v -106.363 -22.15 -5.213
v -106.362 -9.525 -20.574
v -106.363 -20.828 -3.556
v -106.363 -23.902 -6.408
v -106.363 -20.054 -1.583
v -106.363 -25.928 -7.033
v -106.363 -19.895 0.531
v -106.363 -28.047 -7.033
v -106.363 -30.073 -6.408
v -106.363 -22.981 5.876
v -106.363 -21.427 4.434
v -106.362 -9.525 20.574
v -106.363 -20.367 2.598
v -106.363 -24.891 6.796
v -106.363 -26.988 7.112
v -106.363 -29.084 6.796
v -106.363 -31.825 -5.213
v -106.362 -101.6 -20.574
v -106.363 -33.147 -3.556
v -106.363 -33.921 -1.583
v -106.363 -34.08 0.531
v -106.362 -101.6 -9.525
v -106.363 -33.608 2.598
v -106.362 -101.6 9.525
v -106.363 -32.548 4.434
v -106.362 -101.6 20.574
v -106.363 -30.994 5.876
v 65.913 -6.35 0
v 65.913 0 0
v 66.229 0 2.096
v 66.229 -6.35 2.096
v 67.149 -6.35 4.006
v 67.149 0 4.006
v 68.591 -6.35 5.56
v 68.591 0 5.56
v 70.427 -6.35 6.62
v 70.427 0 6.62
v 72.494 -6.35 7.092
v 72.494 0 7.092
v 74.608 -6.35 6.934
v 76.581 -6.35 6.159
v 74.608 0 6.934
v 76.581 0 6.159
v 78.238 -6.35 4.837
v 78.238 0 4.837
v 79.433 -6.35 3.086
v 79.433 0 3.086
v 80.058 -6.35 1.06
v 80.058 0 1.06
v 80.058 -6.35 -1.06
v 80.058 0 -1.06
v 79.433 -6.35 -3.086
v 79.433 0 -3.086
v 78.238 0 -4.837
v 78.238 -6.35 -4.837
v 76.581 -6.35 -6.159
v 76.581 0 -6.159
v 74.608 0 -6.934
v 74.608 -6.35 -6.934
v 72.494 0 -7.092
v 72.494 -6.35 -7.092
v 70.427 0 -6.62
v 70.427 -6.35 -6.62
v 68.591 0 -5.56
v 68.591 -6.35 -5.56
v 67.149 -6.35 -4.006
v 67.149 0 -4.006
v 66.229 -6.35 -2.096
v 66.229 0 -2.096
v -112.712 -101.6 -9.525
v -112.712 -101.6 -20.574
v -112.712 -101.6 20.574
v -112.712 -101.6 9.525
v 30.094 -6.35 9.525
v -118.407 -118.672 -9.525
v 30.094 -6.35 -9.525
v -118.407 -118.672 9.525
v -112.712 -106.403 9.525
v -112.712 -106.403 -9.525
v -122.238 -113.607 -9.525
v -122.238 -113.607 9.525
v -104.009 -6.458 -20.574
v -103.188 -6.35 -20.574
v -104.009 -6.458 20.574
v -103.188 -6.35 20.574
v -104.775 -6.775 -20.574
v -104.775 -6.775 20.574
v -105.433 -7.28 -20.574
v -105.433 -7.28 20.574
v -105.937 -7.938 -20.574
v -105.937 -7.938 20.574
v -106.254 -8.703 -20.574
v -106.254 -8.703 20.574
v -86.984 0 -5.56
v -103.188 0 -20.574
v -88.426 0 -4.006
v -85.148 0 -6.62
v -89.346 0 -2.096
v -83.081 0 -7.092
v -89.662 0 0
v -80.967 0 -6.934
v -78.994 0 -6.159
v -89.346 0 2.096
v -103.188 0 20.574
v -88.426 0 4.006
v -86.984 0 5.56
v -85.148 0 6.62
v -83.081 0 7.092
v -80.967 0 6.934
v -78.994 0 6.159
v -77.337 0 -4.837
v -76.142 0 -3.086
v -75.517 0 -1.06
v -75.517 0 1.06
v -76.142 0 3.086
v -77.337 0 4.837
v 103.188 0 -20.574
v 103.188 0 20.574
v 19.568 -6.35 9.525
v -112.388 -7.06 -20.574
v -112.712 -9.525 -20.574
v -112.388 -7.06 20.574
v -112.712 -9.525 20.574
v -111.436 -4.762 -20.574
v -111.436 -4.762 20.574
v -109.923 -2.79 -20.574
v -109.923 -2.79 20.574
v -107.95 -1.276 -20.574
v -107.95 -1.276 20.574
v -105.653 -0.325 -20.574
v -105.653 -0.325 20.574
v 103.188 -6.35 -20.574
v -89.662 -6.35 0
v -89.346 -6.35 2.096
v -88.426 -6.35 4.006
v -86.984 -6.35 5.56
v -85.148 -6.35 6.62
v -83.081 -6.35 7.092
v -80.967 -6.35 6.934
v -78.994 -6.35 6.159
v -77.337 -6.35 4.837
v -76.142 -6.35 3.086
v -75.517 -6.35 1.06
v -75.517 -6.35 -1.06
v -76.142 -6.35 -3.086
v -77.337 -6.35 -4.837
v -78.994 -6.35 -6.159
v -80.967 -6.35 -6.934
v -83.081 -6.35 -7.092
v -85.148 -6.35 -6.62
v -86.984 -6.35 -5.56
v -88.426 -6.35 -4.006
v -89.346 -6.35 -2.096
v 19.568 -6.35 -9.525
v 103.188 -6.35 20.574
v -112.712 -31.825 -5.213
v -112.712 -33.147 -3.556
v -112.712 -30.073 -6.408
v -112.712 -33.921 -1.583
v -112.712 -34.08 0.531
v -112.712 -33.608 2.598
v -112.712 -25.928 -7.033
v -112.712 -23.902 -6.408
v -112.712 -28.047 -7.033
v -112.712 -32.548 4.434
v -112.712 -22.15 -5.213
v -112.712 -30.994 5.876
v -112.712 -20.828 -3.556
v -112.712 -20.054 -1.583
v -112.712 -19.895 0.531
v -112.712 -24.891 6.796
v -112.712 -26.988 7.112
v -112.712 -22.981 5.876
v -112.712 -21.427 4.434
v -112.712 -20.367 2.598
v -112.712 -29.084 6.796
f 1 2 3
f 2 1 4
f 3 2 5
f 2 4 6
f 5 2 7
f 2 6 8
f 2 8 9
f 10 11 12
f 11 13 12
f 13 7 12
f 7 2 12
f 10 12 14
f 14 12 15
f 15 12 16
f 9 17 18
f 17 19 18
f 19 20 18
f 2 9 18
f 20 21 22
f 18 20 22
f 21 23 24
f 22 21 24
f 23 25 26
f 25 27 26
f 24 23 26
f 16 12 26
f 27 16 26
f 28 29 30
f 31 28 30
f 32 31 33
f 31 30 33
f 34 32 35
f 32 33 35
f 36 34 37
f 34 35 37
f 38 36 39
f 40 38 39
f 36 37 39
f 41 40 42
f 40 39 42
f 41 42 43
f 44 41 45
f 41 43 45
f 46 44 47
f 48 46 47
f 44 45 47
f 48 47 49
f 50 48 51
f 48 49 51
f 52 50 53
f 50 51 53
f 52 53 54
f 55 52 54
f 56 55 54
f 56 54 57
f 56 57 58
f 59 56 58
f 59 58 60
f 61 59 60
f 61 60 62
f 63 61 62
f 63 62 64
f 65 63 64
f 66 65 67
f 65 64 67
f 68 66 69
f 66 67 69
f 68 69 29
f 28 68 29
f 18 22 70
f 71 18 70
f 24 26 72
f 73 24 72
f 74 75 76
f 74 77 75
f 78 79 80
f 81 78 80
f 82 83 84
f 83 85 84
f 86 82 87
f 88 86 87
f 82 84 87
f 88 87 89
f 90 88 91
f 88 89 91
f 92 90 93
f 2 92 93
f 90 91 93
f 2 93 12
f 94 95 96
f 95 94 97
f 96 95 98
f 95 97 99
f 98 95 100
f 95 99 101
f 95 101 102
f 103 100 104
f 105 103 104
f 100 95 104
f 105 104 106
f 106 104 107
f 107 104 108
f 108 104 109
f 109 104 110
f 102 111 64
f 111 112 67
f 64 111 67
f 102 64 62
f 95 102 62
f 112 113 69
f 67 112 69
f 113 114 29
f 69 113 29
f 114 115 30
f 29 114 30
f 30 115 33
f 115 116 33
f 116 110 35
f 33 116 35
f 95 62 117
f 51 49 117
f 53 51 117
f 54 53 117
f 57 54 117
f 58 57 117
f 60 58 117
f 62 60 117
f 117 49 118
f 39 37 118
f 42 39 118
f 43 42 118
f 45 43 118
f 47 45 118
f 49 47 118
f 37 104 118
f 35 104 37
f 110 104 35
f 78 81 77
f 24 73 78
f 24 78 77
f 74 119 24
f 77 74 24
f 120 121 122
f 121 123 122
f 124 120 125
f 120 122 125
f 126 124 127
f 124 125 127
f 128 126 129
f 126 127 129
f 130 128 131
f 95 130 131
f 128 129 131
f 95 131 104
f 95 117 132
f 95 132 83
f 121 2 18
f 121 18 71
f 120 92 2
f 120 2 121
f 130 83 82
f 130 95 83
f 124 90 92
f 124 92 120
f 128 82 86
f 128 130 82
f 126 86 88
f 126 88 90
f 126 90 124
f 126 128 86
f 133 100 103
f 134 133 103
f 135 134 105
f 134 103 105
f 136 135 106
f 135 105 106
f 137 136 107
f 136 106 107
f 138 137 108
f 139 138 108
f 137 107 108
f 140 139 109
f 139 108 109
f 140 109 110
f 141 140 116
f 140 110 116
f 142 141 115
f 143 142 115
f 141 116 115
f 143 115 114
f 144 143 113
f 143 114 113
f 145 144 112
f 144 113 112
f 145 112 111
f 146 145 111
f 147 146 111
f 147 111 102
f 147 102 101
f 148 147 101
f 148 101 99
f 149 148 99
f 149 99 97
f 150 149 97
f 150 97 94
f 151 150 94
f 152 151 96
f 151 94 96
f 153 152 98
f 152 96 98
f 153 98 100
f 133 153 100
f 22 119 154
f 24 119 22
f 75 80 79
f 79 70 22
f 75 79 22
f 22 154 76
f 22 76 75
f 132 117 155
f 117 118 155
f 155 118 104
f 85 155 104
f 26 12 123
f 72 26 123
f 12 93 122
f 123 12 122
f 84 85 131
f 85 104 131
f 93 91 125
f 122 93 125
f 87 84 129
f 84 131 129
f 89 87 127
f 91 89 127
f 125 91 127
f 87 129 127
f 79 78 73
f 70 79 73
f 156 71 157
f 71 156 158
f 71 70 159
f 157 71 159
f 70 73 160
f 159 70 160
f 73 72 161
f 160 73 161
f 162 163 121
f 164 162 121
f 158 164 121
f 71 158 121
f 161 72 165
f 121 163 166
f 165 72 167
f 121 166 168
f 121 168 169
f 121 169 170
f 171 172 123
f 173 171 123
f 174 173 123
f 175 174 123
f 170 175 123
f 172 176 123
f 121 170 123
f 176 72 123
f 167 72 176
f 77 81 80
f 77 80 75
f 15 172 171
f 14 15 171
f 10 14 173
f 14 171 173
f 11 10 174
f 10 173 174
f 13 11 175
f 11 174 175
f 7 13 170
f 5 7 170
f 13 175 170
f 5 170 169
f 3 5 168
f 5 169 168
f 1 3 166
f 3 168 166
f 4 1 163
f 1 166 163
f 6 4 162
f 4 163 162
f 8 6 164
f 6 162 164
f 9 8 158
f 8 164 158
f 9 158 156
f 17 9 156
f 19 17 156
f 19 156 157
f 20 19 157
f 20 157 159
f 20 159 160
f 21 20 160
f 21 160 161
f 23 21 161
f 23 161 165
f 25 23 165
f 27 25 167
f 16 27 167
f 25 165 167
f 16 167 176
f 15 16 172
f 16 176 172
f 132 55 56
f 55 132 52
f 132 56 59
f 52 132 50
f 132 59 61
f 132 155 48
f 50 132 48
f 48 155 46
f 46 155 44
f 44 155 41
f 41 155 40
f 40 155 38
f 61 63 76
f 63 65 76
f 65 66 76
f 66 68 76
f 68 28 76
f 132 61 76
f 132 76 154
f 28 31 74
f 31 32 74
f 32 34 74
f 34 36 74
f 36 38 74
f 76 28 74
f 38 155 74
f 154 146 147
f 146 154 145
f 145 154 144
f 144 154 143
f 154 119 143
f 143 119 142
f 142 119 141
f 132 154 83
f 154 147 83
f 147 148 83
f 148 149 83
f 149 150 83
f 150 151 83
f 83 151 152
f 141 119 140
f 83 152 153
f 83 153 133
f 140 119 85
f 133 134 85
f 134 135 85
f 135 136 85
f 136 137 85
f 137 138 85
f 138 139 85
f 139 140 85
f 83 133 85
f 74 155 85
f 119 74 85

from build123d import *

# Parameters (mm, degrees)
EXTRUDE_THIN1_DEPTH = 20.574
BOSS_EXTRUDE1_DEPTH = 9.525
SKETCH3_R           = 7.112
CUT_EXTRUDE1_DEPTH  = 6.35
SKETCH4_R           = 7.112
CUT_EXTRUDE2_DEPTH  = 6.35


with BuildPart() as part:
    # Sketch1 → Extrude-Thin1 (new, symmetric)
    with BuildSketch(Plane.XY):
        with BuildLine():
            Line((-112.7125, -101.6), (-112.7125, -9.525))
            ThreePointArc((-112.7125, -9.525), (-109.922692091, -2.789807909), (-103.1875, 0))
            Line((-103.1875, 0), (103.1875, 0))
            Line((103.1875, 0), (103.1875, -6.35))
            Line((103.1875, -6.35), (-103.1875, -6.35))
            ThreePointArc((-103.1875, -6.35), (-105.43256403, -7.27993597), (-106.3625, -9.525))
            Line((-106.3625, -9.525), (-106.3625, -101.6))
            Line((-106.3625, -101.6), (-112.7125, -101.6))
        make_face()
    extrude(amount=EXTRUDE_THIN1_DEPTH, both=True)

    # Sketch2 → Boss-Extrude1 (add, symmetric)
    with BuildSketch(Plane.XY):
        Polygon((19.567609966, -6.35), (-106.3625, -101.6), (-112.7125, -101.6), (-112.7125, -106.402961739), (-122.2375, -113.607404348), (-118.406878416, -118.671872561), (30.093969492, -6.35), align=None)
    extrude(amount=BOSS_EXTRUDE1_DEPTH, both=True)

    # Sketch3 → Cut-Extrude1 (cut)
    with BuildSketch(Plane(origin=(0, 0, 0), x_dir=(1, 0, 0), z_dir=(0, 1, 0))):
        with Locations(Location((-82.55, 0, 0), (0, 0, 180))):
            Circle(SKETCH3_R)
        with Locations(Location((73.025, 0, 0), (0, 0, 180))):
            Circle(SKETCH3_R)
    extrude(amount=-CUT_EXTRUDE1_DEPTH, mode=Mode.SUBTRACT)

    # Sketch4 → Cut-Extrude2 (cut)
    with BuildSketch(Plane.ZY.offset(112.7125)):
        with Locations((0, -26.9875)):
            Circle(SKETCH4_R)
    extrude(amount=-CUT_EXTRUDE2_DEPTH, mode=Mode.SUBTRACT)


solid = part.part
